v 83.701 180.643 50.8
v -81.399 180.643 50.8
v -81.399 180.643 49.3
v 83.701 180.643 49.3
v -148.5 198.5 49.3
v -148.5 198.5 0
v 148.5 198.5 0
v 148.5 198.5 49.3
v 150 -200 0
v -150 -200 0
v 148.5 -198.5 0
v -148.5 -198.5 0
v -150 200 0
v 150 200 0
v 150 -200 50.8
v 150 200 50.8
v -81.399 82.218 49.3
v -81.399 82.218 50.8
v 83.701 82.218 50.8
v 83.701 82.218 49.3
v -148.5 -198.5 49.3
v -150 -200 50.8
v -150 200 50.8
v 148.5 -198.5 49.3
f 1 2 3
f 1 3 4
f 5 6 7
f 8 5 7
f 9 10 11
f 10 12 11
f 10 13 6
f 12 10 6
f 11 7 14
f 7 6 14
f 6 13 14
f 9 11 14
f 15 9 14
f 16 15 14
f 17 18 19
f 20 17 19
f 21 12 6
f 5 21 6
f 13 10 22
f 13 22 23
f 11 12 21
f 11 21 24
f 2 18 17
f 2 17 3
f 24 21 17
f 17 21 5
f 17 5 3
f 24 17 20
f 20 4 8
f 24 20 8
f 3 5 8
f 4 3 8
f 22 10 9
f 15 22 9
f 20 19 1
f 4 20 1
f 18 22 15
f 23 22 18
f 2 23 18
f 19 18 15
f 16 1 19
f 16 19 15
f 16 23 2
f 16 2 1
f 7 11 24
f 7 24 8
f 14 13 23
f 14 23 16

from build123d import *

# Parameters (mm, degrees)
SKETCH1_W           = 300
SKETCH1_H           = 400
BOSS_EXTRUDE1_DEPTH = 50.8
SHELL1_T            = -1.500000048
SKETCH2_W           = 165.1
SKETCH2_H           = 98.425
CUT_EXTRUDE1_DEPTH  = 256.109074711


with BuildPart() as part:
    # Sketch1 → Boss-Extrude1 (new body)
    with BuildSketch(Plane.XY):
        Rectangle(SKETCH1_W, SKETCH1_H)
    extrude(amount=BOSS_EXTRUDE1_DEPTH)

    # Shell1
    shell1_openings = [part.faces().sort_by_distance(p)[0] for p in [
        (0, 0, 0),
    ]]
    offset(amount=SHELL1_T, openings=shell1_openings, kind=Kind.INTERSECTION)

    # Sketch2 → Cut-Extrude1 (cut, through all)
    with BuildSketch(Plane.XY.offset(50.8)):
        with Locations((1.151083914, 131.430868262)):
            Rectangle(SKETCH2_W, SKETCH2_H)
    extrude(amount=-CUT_EXTRUDE1_DEPTH, mode=Mode.SUBTRACT)


solid = part.part
